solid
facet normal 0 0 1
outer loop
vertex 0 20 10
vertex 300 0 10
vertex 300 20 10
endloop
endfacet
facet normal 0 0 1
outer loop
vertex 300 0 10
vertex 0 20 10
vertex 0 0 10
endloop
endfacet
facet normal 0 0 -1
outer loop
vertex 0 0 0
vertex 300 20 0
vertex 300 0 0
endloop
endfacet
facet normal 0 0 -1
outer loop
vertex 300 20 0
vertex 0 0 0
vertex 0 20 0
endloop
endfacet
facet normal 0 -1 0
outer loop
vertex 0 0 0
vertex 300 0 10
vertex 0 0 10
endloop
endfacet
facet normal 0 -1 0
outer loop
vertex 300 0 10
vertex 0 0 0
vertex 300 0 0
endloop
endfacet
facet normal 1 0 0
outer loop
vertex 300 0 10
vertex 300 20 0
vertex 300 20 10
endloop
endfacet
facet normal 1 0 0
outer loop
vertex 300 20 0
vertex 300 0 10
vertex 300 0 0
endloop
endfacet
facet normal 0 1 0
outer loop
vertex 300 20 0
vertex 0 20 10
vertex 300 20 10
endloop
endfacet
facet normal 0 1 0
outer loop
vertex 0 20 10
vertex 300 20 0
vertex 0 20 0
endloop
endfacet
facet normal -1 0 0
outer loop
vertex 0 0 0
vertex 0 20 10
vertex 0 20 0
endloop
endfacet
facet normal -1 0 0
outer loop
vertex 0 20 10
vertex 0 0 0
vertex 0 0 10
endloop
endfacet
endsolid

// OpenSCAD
// 300 mm long: over the unverified default 256 bed, over an explicit 256 bed.
cube([300, 20, 10]);
